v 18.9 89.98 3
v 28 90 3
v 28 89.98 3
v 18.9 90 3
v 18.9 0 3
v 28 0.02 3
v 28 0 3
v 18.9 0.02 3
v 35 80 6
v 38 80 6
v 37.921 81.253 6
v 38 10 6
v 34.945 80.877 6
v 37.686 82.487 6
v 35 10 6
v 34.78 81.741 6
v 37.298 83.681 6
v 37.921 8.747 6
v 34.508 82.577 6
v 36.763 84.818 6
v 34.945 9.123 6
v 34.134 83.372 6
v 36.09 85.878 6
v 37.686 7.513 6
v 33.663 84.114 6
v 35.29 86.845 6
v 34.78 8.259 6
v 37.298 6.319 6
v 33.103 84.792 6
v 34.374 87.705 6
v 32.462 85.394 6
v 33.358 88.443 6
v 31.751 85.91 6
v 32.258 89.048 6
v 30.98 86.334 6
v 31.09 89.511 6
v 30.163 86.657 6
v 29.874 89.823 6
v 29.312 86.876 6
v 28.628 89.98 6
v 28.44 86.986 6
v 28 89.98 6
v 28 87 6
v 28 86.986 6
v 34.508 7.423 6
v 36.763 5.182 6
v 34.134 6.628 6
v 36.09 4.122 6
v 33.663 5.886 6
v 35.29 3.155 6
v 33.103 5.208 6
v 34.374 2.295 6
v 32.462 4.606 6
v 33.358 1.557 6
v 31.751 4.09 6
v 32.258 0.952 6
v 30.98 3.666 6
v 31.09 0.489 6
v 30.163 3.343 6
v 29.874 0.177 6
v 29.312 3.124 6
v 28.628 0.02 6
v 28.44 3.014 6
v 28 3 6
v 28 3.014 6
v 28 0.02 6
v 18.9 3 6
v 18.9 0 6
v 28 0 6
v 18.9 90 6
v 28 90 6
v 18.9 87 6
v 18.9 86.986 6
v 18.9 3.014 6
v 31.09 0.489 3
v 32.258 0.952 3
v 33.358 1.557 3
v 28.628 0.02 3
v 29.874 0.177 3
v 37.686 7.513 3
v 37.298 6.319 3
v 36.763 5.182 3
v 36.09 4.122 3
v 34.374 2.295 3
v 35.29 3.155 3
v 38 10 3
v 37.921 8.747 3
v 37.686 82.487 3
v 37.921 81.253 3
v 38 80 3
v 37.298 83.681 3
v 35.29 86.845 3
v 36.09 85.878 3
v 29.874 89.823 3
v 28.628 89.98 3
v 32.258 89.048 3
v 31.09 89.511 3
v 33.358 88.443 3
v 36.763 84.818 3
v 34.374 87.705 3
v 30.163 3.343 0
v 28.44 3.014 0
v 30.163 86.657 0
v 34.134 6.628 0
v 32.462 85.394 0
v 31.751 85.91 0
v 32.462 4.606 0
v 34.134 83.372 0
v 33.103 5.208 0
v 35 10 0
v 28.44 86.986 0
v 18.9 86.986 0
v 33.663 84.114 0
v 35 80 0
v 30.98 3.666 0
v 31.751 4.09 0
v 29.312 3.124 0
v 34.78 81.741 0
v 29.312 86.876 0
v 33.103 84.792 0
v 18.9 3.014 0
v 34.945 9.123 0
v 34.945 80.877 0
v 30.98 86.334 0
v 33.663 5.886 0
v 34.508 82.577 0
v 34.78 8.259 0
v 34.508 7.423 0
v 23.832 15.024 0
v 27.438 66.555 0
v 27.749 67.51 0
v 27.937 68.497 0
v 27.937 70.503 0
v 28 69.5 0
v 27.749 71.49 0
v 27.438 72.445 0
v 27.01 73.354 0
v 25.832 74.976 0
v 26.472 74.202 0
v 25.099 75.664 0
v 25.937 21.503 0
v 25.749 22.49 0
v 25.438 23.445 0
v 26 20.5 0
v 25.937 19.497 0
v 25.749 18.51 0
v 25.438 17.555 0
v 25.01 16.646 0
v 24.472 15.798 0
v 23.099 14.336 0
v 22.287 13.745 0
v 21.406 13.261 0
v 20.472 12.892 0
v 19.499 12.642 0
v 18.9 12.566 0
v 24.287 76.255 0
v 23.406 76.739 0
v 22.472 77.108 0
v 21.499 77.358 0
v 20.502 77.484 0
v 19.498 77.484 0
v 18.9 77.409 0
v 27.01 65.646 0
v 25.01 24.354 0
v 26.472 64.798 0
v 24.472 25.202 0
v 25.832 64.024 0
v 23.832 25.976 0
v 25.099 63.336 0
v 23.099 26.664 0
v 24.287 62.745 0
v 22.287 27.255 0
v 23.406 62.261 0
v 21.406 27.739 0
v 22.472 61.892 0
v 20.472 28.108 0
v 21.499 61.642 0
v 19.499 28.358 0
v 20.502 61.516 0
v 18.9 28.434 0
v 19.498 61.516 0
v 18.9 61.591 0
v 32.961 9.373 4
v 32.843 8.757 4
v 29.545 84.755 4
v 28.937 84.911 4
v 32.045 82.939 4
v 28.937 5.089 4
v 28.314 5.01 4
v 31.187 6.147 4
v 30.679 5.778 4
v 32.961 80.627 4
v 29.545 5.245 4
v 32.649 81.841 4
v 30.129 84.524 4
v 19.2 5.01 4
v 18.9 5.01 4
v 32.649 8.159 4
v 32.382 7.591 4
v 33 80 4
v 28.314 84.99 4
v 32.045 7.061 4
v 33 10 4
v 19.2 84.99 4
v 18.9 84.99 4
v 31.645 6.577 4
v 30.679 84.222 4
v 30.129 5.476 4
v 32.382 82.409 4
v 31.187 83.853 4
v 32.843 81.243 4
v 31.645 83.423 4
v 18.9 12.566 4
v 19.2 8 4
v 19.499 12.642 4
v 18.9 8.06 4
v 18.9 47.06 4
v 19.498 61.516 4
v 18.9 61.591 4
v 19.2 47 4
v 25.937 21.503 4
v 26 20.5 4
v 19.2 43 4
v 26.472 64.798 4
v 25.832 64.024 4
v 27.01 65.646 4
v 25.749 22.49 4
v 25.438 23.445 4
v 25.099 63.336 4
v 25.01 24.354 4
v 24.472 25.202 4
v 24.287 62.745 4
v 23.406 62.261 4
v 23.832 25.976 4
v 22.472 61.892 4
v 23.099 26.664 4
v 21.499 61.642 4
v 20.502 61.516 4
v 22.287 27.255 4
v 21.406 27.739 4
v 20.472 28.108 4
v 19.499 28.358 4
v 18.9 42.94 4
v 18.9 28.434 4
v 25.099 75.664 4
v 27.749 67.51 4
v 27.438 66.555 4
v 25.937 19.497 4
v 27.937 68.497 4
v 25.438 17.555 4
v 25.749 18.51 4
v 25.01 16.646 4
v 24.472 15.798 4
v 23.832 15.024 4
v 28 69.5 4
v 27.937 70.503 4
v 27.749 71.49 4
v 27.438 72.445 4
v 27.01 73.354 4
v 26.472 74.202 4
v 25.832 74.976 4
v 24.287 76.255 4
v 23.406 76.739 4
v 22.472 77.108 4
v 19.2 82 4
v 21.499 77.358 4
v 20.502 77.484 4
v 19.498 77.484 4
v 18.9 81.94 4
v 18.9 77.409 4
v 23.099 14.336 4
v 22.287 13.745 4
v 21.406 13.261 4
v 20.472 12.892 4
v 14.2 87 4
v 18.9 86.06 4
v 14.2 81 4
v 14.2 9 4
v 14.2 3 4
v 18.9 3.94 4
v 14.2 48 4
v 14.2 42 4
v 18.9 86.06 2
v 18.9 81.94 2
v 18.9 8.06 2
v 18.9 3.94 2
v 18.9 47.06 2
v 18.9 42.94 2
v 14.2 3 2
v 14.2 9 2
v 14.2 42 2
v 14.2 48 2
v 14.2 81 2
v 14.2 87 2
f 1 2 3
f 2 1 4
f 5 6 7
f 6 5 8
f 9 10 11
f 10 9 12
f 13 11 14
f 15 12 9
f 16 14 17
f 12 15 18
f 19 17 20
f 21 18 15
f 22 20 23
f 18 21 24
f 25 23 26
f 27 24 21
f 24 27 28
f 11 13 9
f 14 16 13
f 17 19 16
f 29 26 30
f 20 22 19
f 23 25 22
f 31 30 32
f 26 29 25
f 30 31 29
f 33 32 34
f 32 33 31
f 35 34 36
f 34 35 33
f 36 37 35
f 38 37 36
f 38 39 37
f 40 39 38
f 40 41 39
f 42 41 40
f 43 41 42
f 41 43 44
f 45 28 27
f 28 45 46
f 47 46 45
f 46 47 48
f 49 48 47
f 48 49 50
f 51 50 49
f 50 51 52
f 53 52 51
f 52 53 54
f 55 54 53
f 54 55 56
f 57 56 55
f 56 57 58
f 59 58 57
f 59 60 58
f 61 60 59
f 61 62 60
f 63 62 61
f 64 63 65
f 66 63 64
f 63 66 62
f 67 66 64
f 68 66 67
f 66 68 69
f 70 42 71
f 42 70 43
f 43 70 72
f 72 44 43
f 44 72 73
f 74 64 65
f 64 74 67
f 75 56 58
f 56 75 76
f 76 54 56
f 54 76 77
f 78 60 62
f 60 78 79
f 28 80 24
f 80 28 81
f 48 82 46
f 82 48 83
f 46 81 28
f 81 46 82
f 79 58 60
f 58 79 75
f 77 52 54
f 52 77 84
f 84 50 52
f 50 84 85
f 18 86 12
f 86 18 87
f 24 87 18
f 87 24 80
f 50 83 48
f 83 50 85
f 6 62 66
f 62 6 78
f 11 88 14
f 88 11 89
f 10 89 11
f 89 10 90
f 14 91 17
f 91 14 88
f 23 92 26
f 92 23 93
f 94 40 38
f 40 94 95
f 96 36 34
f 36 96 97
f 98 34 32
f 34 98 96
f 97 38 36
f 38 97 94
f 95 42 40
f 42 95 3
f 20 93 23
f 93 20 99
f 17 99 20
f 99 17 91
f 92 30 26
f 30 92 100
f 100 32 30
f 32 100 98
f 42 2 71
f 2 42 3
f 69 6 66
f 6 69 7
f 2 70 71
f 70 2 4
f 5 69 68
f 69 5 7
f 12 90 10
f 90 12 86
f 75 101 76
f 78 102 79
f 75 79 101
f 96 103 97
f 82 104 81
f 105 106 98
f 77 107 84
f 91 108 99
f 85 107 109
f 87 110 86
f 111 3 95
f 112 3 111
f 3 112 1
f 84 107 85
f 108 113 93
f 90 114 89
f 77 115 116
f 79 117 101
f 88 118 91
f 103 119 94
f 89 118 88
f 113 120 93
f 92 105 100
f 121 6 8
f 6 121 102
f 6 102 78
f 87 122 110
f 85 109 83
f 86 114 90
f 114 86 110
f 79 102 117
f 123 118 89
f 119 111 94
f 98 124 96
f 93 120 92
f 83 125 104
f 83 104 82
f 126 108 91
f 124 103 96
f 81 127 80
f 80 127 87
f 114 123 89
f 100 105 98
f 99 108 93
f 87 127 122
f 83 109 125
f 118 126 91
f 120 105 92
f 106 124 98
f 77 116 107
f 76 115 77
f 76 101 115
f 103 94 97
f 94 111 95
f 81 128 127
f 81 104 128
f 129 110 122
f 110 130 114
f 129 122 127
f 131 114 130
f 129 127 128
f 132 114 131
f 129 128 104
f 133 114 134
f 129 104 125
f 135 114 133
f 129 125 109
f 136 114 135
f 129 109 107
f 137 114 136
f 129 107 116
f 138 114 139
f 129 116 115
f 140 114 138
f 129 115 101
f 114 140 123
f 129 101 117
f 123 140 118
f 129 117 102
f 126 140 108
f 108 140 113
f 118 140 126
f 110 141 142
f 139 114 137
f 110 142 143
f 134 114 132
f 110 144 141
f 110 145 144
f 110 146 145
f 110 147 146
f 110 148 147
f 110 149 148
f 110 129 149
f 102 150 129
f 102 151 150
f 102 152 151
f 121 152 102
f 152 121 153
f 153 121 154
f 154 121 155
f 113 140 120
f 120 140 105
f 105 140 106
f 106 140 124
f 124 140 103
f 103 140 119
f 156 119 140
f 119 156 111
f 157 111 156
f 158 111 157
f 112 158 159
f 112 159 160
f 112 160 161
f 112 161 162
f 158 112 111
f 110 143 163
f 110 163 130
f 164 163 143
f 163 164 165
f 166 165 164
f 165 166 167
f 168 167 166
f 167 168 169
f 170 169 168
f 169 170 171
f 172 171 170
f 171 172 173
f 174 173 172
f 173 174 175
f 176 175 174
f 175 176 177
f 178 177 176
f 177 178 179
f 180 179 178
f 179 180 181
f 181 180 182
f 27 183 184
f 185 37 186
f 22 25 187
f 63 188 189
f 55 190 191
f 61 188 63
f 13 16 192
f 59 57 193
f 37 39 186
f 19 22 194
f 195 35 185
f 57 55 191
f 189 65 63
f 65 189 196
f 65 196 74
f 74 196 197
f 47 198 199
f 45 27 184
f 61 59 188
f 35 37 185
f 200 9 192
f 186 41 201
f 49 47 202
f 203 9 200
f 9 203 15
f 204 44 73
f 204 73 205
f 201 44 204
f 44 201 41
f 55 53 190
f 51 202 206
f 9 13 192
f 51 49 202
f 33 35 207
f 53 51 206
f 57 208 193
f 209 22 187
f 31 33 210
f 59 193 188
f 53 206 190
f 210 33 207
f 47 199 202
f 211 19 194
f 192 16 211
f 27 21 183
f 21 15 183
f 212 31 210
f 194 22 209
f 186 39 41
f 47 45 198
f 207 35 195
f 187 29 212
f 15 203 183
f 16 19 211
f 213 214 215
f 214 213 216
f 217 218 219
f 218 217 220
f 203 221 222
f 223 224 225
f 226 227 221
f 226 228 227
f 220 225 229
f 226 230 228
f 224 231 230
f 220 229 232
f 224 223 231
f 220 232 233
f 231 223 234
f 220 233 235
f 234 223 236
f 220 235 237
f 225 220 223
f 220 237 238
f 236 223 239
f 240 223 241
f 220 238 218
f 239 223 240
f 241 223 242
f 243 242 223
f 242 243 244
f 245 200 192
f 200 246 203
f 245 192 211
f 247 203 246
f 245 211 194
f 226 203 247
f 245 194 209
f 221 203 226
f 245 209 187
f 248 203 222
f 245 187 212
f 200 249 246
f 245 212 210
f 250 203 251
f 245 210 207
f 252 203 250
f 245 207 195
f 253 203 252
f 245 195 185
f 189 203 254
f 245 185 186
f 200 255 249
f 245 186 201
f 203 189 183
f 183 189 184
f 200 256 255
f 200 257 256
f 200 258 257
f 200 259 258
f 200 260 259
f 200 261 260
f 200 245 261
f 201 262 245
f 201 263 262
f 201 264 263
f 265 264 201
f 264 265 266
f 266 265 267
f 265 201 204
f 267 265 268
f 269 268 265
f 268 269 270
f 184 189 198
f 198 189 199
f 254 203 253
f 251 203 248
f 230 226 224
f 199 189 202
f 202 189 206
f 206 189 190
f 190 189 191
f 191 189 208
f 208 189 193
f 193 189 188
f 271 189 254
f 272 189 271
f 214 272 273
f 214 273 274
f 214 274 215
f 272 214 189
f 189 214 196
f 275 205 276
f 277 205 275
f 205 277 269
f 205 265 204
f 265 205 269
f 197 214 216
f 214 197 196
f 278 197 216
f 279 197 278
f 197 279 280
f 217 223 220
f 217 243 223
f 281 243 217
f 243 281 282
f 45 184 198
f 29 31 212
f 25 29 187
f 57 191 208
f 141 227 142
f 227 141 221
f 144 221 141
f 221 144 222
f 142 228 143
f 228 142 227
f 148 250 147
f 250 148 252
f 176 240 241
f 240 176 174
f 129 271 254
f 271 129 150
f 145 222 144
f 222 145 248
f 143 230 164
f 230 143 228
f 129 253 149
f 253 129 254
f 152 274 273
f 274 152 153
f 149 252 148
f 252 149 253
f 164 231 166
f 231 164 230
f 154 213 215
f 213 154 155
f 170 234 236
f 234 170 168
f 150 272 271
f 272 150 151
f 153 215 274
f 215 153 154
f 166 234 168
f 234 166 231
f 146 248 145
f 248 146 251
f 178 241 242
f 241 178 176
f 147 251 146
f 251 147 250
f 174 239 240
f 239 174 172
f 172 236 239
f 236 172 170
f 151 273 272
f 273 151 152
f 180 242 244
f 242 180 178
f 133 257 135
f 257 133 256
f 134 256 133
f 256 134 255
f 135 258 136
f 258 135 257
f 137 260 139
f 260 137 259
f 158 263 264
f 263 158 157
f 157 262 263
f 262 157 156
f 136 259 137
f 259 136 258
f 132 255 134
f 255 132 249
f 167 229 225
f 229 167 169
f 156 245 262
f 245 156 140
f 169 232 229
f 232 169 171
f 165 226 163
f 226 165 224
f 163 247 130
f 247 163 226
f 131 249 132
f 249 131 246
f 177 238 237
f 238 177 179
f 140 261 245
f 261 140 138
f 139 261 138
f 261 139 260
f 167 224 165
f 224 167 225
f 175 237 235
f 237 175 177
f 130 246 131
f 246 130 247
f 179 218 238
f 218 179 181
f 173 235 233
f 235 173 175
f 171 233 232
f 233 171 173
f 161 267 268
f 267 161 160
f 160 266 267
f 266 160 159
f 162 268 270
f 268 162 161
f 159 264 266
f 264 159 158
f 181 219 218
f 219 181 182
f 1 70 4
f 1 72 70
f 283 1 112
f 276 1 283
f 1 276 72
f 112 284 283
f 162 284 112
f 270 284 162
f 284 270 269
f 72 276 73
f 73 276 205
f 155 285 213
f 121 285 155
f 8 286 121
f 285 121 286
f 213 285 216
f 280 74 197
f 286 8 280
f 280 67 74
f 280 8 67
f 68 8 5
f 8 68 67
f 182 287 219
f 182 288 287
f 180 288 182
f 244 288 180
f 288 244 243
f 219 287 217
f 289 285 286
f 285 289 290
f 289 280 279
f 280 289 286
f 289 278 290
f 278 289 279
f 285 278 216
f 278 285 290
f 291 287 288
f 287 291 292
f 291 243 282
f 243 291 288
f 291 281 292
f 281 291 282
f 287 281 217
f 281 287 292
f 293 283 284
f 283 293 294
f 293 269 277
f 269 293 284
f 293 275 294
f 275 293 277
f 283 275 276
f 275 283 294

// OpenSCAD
// file: kitchen_config.scad
use <./_cfg.scad>

// Kitchen Configuration Functions
function get_h() = 6;
function get_width() = 38;
function get_length() = 90;
function get_diameter() = 16;
function get_distance() = 49;
function get_nutDistance() = 6;
function get_separation() = 10;
function get_offset_l() = -1;
function get_offset_r() = 1;
// file: _cfg.scad
// Global configuration functions
function get_fn() = 50;
function get_darft() = false;
// file: base.scad
module base(h, width, length, diameter, distance, offset_l=0, offset_r=0, fn) {
    corner_radius=10;

    difference() {
        union() {
            difference() {
                _base_plate_shape(corner_radius, h, width, length, fn);
                translate([3,3,h-2]) {
                    offset=3;
                    _base_plate_shape(corner_radius-offset, h-2, width-offset*2, length-offset*2, fn);
                }
            }
        }

        translate([width/2, length/2-distance/2, -.1]) {
            translate([offset_l, 0, 0])
            cylinder(d=diameter, h=h+.2, center=false, $fn=fn);
            translate([offset_r, distance, 0]) {
                cylinder(d=diameter, h=h+.2, center=false, $fn=fn);
            }
        }
    }
}

module rounded_top_only(corner_radius, h, width, length, fn) {
    minkowski() {
        _base_plate_shape(corner_radius, h - corner_radius, width, length, fn);
        translate([0, 0, corner_radius]) cylinder(r=corner_radius/2, h=0.001, $fn=fn);
    }
}

module _base_plate_shape(corner_radius, h, width, length, fn) {
    hs=h/2;
    hn=h-hs;

    translate([0, 0, hs])

    union() {
        translate([corner_radius, 0, 0])
            cube([width - corner_radius * 2, length, hn], center=false);

        translate([0, corner_radius, 0])
            cube([width, length - corner_radius * 2, hn], center=false);

        for (x = [corner_radius, width - corner_radius])
        for (y = [corner_radius, length - corner_radius])
        translate([x, y, 0])
            cylinder(d = corner_radius * 2, h = hn, center = false, $fn = fn);

        // -------

        hull() {
            for (x = [corner_radius, width - corner_radius])
            for (y = [corner_radius, length - corner_radius])
            translate([x, y, 0])
                translate([0, 0, -hs])
                    cylinder(r1=corner_radius-hs, r2=corner_radius, h = hs, center = false, $fn = fn);
        }
    }
}

module nut(h,extend=0) {
    nut_height=h;
    nut_width=5+extend;
    nut_length=4+extend;
    nut_length_=1+extend;
    rotate([0,0,90]) {
        translate([-nut_length/2,0,0]) {
            linear_extrude(height=nut_height)
                polygon(points=[[0,0], [-nut_length_,nut_width], [0,nut_width]]);

            translate([nut_length,0,0]) {
                linear_extrude(height=nut_height)
                    polygon(points=[[0,0], [nut_length_,nut_width], [0,nut_width]]);
            }

            cube([nut_length, nut_width, nut_height], center=false);
        }
    }
}

module both(h, width, length, diameter, distance, nutDistance, separation, offset_l=0, offset_r=0, fn) {
    left(h, width, length, diameter, distance, nutDistance, offset_l, offset_r, fn);

    translate([-separation, 0, 0])
        right(h, width, length, diameter, distance, nutDistance, offset_l, offset_r, fn);
}

module left(h, width, length, diameter, distance, nutDistance, offset_l=0, offset_r=0, fn) {
    union() {
        translate([0, 0, 0]) {
            difference() {
                base(h, width, length, diameter, distance, offset_l, offset_r, fn);
                translate([-.1, -.1, -.1]) {
                    cube([width / 2, length + .2, h + .2], center = false);
                }
            }
        }

        translate([0.2,0,2])
            translate([width / 2, 0, 0]) {
                translate([0, nutDistance, 0]) {
                    nut(h - 4);
                }
                translate([0, length / 2, 0]) {
                    nut(h - 4);
                }
                translate([0, length - nutDistance, 0]) {
                    nut(h - 4);
                }
            }
    }
}

module right(h, width, length, diameter, distance, nutDistance, offset_l=0, offset_r=0, fn) {
    difference() {
        union() {
            difference() {
                base(h, width, length, diameter, distance, offset_l, offset_r, fn);
                translate([width / 2 + .1, -.1, -.1]) {
                    cube([width / 2, length + .2, h + .2], center = false);
                }
            }
        }

        translate([0.2,0,1.5])
            translate([width / 2 , 0, -.1]) {
                translate([0, nutDistance, 0]) {
                    nut(h - 1.3, extend = .2);
                }
                translate([0, length / 2, 0]) {
                    nut(h - 1.3, extend = .2);
                }
                translate([0, length - nutDistance, 0]) {
                    nut(h - 1.3, extend =  .2);
                }
            }
    }
}
// main file
use <./base.scad>
use <./_cfg.scad>
use <./kitchen_config.scad>

left(
    h=get_h(),
    width=get_width(),
    length=get_length(),
    diameter=get_diameter(),
    distance=get_distance(),
    nutDistance=get_nutDistance(),
    offset_l=get_offset_l(),
    offset_r=get_offset_r(),
    fn=get_fn()
);
